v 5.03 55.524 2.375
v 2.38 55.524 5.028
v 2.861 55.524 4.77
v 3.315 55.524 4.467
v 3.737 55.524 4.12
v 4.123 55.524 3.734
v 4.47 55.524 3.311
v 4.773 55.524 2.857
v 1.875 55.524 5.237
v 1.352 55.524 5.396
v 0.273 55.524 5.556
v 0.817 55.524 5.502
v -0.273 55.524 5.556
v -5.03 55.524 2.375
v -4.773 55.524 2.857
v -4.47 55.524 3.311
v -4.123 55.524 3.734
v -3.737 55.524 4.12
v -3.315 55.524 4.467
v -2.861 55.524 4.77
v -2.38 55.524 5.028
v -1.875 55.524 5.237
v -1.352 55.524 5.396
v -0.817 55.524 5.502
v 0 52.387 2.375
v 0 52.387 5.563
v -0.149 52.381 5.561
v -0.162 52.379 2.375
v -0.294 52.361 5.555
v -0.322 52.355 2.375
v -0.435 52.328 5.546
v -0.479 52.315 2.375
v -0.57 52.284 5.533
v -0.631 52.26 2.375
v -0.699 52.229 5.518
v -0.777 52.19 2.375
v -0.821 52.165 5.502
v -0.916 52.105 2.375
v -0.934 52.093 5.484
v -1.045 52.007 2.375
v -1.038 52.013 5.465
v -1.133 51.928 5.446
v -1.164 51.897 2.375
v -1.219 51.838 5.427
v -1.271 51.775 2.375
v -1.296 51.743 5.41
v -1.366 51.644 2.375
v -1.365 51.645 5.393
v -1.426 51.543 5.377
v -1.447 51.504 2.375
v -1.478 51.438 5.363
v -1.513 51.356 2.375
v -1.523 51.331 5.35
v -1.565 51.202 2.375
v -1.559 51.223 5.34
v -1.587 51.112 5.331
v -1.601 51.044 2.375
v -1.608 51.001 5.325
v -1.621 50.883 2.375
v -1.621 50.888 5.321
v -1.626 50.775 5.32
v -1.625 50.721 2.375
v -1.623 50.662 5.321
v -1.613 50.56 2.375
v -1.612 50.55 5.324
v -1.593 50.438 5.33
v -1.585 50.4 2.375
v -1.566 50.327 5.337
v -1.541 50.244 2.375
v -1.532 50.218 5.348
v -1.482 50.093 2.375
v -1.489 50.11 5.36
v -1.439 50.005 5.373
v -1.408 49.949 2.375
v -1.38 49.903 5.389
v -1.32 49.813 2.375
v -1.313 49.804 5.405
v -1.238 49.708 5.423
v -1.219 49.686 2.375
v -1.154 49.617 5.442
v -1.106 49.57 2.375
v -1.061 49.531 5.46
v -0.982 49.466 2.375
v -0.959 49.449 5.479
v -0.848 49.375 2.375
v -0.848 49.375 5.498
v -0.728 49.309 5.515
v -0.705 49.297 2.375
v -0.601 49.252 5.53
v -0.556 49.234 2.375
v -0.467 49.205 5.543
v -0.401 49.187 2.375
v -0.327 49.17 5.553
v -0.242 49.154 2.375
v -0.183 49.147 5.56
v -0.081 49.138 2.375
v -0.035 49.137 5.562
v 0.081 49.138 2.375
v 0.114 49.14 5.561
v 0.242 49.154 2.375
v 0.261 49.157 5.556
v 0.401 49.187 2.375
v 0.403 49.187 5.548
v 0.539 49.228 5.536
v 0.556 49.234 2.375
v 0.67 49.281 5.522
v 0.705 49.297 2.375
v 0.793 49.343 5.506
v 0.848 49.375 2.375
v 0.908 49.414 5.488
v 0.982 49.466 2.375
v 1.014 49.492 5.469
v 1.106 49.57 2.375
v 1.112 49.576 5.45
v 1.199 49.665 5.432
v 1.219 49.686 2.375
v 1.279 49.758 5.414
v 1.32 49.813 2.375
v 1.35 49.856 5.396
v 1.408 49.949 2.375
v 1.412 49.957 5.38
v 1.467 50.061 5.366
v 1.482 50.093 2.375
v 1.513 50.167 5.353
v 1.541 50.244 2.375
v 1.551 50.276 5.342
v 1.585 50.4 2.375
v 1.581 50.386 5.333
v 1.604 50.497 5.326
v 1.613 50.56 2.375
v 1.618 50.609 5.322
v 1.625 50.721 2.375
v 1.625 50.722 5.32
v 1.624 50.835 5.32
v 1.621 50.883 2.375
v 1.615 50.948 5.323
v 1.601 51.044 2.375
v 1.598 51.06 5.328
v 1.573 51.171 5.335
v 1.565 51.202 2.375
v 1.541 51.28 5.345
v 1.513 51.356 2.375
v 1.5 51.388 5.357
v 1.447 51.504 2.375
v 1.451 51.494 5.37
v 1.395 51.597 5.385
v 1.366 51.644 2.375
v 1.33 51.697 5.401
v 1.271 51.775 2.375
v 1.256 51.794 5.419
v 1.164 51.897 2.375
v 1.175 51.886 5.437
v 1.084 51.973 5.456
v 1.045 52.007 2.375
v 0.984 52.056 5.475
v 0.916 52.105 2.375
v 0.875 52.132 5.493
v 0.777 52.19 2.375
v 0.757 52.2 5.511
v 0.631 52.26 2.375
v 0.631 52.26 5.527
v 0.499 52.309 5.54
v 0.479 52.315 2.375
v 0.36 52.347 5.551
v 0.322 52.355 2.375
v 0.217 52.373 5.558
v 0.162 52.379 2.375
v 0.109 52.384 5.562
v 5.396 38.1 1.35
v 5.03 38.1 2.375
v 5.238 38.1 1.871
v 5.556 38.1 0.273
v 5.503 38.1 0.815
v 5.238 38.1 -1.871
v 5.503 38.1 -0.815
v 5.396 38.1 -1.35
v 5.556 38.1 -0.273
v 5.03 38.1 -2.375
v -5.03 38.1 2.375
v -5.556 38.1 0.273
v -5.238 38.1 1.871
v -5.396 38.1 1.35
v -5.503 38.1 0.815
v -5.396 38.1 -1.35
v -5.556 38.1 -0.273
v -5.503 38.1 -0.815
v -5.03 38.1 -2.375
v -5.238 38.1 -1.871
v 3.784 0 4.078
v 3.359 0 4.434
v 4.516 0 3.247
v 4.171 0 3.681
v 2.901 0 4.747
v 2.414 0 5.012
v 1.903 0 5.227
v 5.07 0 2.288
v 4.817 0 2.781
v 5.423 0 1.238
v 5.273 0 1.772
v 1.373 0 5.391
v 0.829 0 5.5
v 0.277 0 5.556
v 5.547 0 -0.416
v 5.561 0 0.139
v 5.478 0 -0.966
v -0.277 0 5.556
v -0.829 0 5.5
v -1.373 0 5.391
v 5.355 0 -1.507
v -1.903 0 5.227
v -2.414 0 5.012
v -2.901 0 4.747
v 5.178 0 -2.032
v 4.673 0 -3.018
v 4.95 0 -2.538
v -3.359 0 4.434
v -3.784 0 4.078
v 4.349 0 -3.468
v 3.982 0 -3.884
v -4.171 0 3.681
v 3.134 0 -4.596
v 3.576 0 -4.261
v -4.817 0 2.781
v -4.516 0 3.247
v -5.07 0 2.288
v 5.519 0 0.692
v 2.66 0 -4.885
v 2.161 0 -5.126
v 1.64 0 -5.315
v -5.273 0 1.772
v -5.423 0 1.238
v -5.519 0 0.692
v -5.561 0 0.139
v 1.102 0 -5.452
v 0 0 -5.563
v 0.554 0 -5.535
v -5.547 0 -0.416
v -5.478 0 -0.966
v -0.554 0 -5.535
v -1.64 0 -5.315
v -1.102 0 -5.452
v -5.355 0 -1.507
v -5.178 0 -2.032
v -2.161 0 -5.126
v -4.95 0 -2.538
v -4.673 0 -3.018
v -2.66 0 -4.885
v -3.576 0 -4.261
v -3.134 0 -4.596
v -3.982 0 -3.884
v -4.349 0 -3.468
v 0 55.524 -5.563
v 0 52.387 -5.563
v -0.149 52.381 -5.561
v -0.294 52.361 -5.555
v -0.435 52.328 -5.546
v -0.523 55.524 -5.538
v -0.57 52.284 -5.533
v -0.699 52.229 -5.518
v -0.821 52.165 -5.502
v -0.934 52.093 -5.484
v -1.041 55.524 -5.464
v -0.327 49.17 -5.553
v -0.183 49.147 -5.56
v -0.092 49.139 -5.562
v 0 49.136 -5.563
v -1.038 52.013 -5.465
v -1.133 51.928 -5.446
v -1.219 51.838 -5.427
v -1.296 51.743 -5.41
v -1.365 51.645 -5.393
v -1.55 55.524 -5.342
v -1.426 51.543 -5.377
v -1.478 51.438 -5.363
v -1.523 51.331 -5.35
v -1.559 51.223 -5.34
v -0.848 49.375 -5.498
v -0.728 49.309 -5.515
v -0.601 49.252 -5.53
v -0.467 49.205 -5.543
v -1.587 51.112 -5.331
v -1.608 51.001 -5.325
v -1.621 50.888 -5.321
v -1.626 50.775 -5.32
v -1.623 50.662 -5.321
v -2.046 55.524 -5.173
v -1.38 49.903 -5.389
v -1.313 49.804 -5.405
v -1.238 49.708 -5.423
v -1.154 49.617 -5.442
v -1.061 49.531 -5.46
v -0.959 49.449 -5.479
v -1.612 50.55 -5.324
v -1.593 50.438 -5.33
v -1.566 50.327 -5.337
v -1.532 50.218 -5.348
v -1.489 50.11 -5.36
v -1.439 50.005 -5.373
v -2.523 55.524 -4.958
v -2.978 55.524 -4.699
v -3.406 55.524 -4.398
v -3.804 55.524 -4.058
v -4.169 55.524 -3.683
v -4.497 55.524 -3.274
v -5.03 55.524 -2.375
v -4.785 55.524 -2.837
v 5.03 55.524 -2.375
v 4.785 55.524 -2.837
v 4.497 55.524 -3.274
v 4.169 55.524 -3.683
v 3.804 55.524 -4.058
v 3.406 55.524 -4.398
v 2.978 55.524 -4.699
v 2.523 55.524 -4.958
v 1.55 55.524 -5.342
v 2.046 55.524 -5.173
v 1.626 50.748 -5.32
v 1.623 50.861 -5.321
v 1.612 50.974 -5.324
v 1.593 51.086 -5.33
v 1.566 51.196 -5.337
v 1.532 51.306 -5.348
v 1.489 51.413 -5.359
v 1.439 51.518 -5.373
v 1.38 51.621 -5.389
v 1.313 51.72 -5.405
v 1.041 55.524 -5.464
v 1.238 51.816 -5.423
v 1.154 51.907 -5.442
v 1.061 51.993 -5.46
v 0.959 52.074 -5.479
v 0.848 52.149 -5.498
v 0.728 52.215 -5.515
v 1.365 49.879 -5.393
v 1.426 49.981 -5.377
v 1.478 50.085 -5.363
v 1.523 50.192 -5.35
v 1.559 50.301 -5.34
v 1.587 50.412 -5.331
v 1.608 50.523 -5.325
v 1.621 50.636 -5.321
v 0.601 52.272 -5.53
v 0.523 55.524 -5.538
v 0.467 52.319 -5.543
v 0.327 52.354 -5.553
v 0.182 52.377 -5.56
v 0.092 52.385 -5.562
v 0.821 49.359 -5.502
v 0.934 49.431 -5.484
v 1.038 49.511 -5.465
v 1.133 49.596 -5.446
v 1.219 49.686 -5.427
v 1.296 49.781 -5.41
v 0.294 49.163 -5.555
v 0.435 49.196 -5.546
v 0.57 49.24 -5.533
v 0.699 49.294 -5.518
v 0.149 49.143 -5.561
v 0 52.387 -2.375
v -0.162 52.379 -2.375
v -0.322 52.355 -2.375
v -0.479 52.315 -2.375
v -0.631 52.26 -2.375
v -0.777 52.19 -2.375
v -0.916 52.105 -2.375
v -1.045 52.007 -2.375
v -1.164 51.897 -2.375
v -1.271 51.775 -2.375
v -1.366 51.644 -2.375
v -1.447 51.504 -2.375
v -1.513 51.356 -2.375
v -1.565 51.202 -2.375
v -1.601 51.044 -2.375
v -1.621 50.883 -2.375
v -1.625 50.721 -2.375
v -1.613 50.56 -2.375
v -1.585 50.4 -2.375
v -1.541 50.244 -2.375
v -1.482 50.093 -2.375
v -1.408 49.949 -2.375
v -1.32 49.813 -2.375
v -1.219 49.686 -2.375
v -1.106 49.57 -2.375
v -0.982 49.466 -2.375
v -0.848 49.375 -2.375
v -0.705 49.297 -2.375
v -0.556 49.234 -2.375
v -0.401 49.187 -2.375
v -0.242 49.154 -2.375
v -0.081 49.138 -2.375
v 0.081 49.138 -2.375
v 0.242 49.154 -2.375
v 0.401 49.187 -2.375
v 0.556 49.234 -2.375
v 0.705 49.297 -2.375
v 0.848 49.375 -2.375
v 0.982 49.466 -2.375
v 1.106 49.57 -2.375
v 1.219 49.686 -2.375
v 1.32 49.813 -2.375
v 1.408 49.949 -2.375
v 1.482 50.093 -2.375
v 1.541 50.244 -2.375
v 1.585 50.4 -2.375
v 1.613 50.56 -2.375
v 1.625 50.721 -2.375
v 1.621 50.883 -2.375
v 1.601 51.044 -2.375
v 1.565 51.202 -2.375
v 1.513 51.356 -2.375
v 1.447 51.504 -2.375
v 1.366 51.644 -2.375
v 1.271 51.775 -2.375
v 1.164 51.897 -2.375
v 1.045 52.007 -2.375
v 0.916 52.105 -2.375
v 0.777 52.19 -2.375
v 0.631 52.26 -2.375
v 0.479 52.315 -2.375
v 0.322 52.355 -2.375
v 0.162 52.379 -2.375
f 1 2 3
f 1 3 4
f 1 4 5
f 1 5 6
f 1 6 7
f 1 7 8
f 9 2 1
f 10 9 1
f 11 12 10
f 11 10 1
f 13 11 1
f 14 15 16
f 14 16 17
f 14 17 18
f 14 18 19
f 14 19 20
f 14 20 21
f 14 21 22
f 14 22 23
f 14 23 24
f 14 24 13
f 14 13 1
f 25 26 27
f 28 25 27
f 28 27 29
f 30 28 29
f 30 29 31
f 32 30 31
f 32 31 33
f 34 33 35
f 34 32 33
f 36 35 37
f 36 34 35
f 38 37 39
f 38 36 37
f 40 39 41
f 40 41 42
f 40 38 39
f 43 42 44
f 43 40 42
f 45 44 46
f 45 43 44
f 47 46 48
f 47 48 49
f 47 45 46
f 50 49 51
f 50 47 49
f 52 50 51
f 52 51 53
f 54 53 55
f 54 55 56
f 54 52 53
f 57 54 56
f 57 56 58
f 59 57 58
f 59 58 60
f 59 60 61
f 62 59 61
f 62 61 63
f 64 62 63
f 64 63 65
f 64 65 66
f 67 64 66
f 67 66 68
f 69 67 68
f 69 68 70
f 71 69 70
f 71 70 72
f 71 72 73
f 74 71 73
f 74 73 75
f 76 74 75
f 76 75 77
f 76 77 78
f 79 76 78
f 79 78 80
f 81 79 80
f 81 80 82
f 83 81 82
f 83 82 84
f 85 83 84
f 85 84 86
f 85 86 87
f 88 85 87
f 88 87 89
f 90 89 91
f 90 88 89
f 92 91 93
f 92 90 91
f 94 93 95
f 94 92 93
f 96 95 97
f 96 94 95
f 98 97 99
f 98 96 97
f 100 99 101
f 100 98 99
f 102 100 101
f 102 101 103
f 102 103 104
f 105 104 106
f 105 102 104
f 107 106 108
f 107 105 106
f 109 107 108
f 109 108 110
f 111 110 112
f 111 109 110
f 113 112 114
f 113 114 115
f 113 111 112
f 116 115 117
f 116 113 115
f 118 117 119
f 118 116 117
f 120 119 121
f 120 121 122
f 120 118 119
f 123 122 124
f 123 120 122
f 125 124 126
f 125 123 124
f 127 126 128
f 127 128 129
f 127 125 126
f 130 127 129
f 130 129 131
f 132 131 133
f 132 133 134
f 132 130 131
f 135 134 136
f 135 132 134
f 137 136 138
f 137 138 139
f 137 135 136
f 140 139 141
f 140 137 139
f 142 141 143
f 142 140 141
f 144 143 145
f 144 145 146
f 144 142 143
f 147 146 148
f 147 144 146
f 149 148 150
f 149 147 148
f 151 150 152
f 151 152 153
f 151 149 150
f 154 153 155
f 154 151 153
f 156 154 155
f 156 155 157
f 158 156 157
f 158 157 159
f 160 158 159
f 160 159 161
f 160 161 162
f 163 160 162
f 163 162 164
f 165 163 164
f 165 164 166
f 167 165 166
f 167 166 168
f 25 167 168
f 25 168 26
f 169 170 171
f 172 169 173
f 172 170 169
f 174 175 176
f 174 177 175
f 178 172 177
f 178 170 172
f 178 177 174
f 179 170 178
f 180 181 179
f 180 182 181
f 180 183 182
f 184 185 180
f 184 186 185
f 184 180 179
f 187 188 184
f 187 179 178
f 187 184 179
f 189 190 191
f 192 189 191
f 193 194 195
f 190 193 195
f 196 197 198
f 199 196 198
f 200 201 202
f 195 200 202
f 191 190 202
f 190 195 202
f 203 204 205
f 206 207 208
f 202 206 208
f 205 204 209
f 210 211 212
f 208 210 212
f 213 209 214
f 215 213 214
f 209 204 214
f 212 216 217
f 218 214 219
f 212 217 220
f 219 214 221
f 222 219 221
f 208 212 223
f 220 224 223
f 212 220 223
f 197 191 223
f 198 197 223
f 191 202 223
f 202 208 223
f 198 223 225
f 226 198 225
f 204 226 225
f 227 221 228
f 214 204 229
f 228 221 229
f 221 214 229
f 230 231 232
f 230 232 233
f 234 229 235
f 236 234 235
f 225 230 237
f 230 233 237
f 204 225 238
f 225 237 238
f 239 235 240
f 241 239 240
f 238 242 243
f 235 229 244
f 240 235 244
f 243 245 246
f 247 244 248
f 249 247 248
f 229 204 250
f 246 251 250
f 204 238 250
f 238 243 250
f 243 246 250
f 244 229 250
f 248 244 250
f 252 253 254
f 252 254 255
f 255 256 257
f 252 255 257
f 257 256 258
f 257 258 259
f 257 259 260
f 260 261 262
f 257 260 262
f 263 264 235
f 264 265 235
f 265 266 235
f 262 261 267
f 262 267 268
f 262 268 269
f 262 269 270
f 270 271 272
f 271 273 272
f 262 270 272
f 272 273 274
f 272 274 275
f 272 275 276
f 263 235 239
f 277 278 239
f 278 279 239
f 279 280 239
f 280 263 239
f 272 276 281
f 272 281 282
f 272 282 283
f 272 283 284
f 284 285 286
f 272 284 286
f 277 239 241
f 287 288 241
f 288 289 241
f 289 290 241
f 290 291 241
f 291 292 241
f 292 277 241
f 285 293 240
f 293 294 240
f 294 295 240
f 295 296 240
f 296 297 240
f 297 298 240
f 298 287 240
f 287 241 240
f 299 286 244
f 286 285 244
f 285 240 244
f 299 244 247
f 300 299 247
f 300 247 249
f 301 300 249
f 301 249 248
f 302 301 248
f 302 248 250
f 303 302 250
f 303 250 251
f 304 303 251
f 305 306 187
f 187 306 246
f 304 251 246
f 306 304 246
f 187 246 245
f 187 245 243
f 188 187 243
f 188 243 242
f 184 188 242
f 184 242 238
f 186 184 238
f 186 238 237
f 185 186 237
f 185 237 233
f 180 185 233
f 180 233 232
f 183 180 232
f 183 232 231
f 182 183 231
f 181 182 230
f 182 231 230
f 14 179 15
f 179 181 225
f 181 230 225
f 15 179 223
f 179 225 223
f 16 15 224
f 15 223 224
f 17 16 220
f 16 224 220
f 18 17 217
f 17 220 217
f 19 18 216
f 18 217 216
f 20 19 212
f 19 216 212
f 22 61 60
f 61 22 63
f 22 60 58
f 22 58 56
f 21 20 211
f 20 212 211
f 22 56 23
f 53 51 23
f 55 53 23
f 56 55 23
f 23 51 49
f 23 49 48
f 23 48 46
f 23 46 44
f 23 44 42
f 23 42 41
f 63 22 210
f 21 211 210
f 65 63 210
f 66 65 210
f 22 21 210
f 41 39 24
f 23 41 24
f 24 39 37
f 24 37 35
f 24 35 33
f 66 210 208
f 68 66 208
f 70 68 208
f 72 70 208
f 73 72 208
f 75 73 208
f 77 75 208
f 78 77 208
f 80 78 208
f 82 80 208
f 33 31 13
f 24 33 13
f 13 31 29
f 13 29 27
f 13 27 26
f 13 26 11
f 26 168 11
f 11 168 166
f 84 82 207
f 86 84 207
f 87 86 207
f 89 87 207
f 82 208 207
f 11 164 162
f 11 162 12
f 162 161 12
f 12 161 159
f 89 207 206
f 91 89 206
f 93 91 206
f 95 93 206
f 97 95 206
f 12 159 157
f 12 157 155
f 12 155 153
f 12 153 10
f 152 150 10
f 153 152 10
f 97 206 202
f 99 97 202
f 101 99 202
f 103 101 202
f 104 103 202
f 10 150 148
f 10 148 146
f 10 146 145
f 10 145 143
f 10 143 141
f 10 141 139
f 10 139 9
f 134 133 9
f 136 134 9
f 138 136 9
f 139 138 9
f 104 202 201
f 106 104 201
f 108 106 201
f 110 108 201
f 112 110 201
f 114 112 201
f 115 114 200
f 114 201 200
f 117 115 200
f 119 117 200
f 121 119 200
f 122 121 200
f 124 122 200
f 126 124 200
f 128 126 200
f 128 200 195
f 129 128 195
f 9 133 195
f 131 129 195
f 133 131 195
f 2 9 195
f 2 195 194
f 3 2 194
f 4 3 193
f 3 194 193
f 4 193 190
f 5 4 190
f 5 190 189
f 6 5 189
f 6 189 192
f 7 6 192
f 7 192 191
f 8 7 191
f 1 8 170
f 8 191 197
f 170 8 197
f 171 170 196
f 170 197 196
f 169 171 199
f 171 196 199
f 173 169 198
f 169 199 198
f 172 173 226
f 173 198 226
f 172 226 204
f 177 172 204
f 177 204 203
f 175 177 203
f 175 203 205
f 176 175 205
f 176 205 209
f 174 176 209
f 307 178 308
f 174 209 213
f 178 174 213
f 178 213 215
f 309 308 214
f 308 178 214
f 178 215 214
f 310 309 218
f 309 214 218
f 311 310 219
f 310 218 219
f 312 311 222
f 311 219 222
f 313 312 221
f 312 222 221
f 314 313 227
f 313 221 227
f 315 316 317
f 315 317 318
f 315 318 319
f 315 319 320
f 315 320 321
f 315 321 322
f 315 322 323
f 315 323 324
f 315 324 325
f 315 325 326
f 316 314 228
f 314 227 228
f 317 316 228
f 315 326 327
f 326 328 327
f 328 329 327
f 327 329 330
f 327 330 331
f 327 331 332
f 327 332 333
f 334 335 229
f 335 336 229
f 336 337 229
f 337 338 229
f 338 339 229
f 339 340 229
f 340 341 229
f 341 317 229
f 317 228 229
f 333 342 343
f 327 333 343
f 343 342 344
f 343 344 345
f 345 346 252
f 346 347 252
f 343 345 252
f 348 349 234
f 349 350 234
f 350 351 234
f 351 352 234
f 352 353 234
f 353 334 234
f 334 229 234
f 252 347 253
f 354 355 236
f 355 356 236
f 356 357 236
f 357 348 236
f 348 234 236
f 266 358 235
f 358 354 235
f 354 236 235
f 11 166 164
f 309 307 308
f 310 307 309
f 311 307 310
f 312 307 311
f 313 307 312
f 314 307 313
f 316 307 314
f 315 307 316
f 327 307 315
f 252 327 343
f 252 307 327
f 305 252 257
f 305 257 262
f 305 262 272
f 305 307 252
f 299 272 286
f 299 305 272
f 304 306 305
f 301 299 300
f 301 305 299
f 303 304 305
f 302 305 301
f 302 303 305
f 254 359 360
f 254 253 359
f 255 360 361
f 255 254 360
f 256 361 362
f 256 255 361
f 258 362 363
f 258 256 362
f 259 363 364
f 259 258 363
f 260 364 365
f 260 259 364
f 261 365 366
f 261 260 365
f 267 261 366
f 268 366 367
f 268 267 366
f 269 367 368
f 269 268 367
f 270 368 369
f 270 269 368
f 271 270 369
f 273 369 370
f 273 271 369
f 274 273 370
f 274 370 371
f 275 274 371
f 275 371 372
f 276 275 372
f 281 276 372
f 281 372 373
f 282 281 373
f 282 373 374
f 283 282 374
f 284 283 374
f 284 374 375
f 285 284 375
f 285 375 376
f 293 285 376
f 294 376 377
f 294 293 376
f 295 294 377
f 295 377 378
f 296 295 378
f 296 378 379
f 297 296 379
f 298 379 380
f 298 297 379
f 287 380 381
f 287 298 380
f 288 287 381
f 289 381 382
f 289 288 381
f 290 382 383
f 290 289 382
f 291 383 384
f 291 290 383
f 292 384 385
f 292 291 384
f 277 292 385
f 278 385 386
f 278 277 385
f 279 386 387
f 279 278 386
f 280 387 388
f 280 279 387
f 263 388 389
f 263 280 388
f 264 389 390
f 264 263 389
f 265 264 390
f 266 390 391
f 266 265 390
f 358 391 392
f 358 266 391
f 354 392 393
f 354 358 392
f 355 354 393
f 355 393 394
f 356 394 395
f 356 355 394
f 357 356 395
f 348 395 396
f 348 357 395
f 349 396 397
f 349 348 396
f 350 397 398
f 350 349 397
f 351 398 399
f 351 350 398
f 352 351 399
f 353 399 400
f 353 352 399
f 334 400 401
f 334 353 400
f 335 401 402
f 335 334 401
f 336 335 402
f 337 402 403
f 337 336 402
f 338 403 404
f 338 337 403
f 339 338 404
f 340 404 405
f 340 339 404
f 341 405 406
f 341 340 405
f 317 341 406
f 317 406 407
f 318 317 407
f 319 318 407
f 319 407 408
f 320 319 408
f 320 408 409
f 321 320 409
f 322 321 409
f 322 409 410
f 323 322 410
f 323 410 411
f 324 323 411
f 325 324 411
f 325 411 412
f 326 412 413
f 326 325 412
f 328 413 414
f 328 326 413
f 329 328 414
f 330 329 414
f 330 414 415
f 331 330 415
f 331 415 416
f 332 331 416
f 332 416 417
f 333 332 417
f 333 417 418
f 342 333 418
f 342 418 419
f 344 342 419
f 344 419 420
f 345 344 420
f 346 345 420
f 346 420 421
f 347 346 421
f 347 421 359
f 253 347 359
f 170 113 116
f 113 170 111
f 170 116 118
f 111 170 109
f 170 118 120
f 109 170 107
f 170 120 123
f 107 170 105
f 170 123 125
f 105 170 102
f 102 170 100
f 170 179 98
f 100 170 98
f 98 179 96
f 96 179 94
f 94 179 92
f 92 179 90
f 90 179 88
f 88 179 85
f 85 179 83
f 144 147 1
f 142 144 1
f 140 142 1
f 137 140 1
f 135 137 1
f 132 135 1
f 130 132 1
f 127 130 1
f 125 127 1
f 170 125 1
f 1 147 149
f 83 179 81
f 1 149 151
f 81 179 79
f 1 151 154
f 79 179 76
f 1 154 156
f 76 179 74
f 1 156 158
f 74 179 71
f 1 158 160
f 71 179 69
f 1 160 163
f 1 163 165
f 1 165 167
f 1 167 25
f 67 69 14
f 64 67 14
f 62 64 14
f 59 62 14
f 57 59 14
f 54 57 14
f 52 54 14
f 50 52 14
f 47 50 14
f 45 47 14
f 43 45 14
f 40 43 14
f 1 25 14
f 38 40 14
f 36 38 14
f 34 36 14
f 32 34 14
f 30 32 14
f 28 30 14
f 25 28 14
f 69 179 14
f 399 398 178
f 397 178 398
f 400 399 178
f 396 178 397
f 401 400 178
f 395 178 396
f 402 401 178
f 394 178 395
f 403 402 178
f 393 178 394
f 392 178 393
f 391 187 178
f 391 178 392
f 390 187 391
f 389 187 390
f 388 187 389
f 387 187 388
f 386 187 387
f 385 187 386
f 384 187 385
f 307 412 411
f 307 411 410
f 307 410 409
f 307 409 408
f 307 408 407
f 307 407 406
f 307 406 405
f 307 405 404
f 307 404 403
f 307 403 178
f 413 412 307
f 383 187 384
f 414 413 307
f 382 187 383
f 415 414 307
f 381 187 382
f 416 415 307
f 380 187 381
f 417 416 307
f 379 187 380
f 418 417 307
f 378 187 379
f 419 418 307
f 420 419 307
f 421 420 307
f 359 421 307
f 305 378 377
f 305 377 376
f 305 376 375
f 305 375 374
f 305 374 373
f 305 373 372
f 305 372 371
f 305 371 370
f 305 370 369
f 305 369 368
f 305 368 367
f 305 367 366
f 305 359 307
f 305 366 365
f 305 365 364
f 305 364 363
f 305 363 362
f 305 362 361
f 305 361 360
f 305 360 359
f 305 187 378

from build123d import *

# Parameters (mm, degrees)
SKETCH1_R               = 5.5626
BOSS_EXTRUDE1_DEPTH     = 55.5244
CUT_EXTRUDE1_DEPTH      = 57.078908984
CUT_EXTRUDE1_DEPTH_BACK = 57.078908984
SKETCH2_R               = 1.6256
CUT_EXTRUDE2_DEPTH      = 57.078909103
CUT_EXTRUDE2_DEPTH_BACK = 57.078909103
SKETCH3_W               = 4.7498
SKETCH3_H               = 17.4244


with BuildPart() as part:
    # Sketch1 → Boss-Extrude1 (new body)
    with BuildSketch(Plane(origin=(0, 0, 0), x_dir=(1, 0, 0), z_dir=(0, 1, 0))):
        with Locations(Location((0, 0, 0), (0, 0, 90))):
            Circle(SKETCH1_R)
    extrude(amount=BOSS_EXTRUDE1_DEPTH)

    # Sketch2 → Cut-Extrude1 (cut, two sides: drawn at the far end of the back side and taken through both)
    with BuildSketch(Plane.XY.offset(-CUT_EXTRUDE1_DEPTH_BACK)):
        with Locations(Location((0, 50.7619, 0), (0, 0, 89.999999974))):
            Circle(SKETCH2_R)
    extrude(amount=CUT_EXTRUDE1_DEPTH + CUT_EXTRUDE1_DEPTH_BACK, mode=Mode.SUBTRACT)

    # Sketch3 → Cut-Extrude2 (cut, two sides: drawn at the far end of the back side and taken through both)
    with BuildSketch(Plane(origin=(0, 0, 0), x_dir=(0, 0, -1), z_dir=(1, 0, 0)).offset(-CUT_EXTRUDE2_DEPTH_BACK)):
        with Locations((0, 46.8122)):
            Rectangle(SKETCH3_W, SKETCH3_H)
    extrude(amount=CUT_EXTRUDE2_DEPTH + CUT_EXTRUDE2_DEPTH_BACK, mode=Mode.SUBTRACT)


solid = part.part
